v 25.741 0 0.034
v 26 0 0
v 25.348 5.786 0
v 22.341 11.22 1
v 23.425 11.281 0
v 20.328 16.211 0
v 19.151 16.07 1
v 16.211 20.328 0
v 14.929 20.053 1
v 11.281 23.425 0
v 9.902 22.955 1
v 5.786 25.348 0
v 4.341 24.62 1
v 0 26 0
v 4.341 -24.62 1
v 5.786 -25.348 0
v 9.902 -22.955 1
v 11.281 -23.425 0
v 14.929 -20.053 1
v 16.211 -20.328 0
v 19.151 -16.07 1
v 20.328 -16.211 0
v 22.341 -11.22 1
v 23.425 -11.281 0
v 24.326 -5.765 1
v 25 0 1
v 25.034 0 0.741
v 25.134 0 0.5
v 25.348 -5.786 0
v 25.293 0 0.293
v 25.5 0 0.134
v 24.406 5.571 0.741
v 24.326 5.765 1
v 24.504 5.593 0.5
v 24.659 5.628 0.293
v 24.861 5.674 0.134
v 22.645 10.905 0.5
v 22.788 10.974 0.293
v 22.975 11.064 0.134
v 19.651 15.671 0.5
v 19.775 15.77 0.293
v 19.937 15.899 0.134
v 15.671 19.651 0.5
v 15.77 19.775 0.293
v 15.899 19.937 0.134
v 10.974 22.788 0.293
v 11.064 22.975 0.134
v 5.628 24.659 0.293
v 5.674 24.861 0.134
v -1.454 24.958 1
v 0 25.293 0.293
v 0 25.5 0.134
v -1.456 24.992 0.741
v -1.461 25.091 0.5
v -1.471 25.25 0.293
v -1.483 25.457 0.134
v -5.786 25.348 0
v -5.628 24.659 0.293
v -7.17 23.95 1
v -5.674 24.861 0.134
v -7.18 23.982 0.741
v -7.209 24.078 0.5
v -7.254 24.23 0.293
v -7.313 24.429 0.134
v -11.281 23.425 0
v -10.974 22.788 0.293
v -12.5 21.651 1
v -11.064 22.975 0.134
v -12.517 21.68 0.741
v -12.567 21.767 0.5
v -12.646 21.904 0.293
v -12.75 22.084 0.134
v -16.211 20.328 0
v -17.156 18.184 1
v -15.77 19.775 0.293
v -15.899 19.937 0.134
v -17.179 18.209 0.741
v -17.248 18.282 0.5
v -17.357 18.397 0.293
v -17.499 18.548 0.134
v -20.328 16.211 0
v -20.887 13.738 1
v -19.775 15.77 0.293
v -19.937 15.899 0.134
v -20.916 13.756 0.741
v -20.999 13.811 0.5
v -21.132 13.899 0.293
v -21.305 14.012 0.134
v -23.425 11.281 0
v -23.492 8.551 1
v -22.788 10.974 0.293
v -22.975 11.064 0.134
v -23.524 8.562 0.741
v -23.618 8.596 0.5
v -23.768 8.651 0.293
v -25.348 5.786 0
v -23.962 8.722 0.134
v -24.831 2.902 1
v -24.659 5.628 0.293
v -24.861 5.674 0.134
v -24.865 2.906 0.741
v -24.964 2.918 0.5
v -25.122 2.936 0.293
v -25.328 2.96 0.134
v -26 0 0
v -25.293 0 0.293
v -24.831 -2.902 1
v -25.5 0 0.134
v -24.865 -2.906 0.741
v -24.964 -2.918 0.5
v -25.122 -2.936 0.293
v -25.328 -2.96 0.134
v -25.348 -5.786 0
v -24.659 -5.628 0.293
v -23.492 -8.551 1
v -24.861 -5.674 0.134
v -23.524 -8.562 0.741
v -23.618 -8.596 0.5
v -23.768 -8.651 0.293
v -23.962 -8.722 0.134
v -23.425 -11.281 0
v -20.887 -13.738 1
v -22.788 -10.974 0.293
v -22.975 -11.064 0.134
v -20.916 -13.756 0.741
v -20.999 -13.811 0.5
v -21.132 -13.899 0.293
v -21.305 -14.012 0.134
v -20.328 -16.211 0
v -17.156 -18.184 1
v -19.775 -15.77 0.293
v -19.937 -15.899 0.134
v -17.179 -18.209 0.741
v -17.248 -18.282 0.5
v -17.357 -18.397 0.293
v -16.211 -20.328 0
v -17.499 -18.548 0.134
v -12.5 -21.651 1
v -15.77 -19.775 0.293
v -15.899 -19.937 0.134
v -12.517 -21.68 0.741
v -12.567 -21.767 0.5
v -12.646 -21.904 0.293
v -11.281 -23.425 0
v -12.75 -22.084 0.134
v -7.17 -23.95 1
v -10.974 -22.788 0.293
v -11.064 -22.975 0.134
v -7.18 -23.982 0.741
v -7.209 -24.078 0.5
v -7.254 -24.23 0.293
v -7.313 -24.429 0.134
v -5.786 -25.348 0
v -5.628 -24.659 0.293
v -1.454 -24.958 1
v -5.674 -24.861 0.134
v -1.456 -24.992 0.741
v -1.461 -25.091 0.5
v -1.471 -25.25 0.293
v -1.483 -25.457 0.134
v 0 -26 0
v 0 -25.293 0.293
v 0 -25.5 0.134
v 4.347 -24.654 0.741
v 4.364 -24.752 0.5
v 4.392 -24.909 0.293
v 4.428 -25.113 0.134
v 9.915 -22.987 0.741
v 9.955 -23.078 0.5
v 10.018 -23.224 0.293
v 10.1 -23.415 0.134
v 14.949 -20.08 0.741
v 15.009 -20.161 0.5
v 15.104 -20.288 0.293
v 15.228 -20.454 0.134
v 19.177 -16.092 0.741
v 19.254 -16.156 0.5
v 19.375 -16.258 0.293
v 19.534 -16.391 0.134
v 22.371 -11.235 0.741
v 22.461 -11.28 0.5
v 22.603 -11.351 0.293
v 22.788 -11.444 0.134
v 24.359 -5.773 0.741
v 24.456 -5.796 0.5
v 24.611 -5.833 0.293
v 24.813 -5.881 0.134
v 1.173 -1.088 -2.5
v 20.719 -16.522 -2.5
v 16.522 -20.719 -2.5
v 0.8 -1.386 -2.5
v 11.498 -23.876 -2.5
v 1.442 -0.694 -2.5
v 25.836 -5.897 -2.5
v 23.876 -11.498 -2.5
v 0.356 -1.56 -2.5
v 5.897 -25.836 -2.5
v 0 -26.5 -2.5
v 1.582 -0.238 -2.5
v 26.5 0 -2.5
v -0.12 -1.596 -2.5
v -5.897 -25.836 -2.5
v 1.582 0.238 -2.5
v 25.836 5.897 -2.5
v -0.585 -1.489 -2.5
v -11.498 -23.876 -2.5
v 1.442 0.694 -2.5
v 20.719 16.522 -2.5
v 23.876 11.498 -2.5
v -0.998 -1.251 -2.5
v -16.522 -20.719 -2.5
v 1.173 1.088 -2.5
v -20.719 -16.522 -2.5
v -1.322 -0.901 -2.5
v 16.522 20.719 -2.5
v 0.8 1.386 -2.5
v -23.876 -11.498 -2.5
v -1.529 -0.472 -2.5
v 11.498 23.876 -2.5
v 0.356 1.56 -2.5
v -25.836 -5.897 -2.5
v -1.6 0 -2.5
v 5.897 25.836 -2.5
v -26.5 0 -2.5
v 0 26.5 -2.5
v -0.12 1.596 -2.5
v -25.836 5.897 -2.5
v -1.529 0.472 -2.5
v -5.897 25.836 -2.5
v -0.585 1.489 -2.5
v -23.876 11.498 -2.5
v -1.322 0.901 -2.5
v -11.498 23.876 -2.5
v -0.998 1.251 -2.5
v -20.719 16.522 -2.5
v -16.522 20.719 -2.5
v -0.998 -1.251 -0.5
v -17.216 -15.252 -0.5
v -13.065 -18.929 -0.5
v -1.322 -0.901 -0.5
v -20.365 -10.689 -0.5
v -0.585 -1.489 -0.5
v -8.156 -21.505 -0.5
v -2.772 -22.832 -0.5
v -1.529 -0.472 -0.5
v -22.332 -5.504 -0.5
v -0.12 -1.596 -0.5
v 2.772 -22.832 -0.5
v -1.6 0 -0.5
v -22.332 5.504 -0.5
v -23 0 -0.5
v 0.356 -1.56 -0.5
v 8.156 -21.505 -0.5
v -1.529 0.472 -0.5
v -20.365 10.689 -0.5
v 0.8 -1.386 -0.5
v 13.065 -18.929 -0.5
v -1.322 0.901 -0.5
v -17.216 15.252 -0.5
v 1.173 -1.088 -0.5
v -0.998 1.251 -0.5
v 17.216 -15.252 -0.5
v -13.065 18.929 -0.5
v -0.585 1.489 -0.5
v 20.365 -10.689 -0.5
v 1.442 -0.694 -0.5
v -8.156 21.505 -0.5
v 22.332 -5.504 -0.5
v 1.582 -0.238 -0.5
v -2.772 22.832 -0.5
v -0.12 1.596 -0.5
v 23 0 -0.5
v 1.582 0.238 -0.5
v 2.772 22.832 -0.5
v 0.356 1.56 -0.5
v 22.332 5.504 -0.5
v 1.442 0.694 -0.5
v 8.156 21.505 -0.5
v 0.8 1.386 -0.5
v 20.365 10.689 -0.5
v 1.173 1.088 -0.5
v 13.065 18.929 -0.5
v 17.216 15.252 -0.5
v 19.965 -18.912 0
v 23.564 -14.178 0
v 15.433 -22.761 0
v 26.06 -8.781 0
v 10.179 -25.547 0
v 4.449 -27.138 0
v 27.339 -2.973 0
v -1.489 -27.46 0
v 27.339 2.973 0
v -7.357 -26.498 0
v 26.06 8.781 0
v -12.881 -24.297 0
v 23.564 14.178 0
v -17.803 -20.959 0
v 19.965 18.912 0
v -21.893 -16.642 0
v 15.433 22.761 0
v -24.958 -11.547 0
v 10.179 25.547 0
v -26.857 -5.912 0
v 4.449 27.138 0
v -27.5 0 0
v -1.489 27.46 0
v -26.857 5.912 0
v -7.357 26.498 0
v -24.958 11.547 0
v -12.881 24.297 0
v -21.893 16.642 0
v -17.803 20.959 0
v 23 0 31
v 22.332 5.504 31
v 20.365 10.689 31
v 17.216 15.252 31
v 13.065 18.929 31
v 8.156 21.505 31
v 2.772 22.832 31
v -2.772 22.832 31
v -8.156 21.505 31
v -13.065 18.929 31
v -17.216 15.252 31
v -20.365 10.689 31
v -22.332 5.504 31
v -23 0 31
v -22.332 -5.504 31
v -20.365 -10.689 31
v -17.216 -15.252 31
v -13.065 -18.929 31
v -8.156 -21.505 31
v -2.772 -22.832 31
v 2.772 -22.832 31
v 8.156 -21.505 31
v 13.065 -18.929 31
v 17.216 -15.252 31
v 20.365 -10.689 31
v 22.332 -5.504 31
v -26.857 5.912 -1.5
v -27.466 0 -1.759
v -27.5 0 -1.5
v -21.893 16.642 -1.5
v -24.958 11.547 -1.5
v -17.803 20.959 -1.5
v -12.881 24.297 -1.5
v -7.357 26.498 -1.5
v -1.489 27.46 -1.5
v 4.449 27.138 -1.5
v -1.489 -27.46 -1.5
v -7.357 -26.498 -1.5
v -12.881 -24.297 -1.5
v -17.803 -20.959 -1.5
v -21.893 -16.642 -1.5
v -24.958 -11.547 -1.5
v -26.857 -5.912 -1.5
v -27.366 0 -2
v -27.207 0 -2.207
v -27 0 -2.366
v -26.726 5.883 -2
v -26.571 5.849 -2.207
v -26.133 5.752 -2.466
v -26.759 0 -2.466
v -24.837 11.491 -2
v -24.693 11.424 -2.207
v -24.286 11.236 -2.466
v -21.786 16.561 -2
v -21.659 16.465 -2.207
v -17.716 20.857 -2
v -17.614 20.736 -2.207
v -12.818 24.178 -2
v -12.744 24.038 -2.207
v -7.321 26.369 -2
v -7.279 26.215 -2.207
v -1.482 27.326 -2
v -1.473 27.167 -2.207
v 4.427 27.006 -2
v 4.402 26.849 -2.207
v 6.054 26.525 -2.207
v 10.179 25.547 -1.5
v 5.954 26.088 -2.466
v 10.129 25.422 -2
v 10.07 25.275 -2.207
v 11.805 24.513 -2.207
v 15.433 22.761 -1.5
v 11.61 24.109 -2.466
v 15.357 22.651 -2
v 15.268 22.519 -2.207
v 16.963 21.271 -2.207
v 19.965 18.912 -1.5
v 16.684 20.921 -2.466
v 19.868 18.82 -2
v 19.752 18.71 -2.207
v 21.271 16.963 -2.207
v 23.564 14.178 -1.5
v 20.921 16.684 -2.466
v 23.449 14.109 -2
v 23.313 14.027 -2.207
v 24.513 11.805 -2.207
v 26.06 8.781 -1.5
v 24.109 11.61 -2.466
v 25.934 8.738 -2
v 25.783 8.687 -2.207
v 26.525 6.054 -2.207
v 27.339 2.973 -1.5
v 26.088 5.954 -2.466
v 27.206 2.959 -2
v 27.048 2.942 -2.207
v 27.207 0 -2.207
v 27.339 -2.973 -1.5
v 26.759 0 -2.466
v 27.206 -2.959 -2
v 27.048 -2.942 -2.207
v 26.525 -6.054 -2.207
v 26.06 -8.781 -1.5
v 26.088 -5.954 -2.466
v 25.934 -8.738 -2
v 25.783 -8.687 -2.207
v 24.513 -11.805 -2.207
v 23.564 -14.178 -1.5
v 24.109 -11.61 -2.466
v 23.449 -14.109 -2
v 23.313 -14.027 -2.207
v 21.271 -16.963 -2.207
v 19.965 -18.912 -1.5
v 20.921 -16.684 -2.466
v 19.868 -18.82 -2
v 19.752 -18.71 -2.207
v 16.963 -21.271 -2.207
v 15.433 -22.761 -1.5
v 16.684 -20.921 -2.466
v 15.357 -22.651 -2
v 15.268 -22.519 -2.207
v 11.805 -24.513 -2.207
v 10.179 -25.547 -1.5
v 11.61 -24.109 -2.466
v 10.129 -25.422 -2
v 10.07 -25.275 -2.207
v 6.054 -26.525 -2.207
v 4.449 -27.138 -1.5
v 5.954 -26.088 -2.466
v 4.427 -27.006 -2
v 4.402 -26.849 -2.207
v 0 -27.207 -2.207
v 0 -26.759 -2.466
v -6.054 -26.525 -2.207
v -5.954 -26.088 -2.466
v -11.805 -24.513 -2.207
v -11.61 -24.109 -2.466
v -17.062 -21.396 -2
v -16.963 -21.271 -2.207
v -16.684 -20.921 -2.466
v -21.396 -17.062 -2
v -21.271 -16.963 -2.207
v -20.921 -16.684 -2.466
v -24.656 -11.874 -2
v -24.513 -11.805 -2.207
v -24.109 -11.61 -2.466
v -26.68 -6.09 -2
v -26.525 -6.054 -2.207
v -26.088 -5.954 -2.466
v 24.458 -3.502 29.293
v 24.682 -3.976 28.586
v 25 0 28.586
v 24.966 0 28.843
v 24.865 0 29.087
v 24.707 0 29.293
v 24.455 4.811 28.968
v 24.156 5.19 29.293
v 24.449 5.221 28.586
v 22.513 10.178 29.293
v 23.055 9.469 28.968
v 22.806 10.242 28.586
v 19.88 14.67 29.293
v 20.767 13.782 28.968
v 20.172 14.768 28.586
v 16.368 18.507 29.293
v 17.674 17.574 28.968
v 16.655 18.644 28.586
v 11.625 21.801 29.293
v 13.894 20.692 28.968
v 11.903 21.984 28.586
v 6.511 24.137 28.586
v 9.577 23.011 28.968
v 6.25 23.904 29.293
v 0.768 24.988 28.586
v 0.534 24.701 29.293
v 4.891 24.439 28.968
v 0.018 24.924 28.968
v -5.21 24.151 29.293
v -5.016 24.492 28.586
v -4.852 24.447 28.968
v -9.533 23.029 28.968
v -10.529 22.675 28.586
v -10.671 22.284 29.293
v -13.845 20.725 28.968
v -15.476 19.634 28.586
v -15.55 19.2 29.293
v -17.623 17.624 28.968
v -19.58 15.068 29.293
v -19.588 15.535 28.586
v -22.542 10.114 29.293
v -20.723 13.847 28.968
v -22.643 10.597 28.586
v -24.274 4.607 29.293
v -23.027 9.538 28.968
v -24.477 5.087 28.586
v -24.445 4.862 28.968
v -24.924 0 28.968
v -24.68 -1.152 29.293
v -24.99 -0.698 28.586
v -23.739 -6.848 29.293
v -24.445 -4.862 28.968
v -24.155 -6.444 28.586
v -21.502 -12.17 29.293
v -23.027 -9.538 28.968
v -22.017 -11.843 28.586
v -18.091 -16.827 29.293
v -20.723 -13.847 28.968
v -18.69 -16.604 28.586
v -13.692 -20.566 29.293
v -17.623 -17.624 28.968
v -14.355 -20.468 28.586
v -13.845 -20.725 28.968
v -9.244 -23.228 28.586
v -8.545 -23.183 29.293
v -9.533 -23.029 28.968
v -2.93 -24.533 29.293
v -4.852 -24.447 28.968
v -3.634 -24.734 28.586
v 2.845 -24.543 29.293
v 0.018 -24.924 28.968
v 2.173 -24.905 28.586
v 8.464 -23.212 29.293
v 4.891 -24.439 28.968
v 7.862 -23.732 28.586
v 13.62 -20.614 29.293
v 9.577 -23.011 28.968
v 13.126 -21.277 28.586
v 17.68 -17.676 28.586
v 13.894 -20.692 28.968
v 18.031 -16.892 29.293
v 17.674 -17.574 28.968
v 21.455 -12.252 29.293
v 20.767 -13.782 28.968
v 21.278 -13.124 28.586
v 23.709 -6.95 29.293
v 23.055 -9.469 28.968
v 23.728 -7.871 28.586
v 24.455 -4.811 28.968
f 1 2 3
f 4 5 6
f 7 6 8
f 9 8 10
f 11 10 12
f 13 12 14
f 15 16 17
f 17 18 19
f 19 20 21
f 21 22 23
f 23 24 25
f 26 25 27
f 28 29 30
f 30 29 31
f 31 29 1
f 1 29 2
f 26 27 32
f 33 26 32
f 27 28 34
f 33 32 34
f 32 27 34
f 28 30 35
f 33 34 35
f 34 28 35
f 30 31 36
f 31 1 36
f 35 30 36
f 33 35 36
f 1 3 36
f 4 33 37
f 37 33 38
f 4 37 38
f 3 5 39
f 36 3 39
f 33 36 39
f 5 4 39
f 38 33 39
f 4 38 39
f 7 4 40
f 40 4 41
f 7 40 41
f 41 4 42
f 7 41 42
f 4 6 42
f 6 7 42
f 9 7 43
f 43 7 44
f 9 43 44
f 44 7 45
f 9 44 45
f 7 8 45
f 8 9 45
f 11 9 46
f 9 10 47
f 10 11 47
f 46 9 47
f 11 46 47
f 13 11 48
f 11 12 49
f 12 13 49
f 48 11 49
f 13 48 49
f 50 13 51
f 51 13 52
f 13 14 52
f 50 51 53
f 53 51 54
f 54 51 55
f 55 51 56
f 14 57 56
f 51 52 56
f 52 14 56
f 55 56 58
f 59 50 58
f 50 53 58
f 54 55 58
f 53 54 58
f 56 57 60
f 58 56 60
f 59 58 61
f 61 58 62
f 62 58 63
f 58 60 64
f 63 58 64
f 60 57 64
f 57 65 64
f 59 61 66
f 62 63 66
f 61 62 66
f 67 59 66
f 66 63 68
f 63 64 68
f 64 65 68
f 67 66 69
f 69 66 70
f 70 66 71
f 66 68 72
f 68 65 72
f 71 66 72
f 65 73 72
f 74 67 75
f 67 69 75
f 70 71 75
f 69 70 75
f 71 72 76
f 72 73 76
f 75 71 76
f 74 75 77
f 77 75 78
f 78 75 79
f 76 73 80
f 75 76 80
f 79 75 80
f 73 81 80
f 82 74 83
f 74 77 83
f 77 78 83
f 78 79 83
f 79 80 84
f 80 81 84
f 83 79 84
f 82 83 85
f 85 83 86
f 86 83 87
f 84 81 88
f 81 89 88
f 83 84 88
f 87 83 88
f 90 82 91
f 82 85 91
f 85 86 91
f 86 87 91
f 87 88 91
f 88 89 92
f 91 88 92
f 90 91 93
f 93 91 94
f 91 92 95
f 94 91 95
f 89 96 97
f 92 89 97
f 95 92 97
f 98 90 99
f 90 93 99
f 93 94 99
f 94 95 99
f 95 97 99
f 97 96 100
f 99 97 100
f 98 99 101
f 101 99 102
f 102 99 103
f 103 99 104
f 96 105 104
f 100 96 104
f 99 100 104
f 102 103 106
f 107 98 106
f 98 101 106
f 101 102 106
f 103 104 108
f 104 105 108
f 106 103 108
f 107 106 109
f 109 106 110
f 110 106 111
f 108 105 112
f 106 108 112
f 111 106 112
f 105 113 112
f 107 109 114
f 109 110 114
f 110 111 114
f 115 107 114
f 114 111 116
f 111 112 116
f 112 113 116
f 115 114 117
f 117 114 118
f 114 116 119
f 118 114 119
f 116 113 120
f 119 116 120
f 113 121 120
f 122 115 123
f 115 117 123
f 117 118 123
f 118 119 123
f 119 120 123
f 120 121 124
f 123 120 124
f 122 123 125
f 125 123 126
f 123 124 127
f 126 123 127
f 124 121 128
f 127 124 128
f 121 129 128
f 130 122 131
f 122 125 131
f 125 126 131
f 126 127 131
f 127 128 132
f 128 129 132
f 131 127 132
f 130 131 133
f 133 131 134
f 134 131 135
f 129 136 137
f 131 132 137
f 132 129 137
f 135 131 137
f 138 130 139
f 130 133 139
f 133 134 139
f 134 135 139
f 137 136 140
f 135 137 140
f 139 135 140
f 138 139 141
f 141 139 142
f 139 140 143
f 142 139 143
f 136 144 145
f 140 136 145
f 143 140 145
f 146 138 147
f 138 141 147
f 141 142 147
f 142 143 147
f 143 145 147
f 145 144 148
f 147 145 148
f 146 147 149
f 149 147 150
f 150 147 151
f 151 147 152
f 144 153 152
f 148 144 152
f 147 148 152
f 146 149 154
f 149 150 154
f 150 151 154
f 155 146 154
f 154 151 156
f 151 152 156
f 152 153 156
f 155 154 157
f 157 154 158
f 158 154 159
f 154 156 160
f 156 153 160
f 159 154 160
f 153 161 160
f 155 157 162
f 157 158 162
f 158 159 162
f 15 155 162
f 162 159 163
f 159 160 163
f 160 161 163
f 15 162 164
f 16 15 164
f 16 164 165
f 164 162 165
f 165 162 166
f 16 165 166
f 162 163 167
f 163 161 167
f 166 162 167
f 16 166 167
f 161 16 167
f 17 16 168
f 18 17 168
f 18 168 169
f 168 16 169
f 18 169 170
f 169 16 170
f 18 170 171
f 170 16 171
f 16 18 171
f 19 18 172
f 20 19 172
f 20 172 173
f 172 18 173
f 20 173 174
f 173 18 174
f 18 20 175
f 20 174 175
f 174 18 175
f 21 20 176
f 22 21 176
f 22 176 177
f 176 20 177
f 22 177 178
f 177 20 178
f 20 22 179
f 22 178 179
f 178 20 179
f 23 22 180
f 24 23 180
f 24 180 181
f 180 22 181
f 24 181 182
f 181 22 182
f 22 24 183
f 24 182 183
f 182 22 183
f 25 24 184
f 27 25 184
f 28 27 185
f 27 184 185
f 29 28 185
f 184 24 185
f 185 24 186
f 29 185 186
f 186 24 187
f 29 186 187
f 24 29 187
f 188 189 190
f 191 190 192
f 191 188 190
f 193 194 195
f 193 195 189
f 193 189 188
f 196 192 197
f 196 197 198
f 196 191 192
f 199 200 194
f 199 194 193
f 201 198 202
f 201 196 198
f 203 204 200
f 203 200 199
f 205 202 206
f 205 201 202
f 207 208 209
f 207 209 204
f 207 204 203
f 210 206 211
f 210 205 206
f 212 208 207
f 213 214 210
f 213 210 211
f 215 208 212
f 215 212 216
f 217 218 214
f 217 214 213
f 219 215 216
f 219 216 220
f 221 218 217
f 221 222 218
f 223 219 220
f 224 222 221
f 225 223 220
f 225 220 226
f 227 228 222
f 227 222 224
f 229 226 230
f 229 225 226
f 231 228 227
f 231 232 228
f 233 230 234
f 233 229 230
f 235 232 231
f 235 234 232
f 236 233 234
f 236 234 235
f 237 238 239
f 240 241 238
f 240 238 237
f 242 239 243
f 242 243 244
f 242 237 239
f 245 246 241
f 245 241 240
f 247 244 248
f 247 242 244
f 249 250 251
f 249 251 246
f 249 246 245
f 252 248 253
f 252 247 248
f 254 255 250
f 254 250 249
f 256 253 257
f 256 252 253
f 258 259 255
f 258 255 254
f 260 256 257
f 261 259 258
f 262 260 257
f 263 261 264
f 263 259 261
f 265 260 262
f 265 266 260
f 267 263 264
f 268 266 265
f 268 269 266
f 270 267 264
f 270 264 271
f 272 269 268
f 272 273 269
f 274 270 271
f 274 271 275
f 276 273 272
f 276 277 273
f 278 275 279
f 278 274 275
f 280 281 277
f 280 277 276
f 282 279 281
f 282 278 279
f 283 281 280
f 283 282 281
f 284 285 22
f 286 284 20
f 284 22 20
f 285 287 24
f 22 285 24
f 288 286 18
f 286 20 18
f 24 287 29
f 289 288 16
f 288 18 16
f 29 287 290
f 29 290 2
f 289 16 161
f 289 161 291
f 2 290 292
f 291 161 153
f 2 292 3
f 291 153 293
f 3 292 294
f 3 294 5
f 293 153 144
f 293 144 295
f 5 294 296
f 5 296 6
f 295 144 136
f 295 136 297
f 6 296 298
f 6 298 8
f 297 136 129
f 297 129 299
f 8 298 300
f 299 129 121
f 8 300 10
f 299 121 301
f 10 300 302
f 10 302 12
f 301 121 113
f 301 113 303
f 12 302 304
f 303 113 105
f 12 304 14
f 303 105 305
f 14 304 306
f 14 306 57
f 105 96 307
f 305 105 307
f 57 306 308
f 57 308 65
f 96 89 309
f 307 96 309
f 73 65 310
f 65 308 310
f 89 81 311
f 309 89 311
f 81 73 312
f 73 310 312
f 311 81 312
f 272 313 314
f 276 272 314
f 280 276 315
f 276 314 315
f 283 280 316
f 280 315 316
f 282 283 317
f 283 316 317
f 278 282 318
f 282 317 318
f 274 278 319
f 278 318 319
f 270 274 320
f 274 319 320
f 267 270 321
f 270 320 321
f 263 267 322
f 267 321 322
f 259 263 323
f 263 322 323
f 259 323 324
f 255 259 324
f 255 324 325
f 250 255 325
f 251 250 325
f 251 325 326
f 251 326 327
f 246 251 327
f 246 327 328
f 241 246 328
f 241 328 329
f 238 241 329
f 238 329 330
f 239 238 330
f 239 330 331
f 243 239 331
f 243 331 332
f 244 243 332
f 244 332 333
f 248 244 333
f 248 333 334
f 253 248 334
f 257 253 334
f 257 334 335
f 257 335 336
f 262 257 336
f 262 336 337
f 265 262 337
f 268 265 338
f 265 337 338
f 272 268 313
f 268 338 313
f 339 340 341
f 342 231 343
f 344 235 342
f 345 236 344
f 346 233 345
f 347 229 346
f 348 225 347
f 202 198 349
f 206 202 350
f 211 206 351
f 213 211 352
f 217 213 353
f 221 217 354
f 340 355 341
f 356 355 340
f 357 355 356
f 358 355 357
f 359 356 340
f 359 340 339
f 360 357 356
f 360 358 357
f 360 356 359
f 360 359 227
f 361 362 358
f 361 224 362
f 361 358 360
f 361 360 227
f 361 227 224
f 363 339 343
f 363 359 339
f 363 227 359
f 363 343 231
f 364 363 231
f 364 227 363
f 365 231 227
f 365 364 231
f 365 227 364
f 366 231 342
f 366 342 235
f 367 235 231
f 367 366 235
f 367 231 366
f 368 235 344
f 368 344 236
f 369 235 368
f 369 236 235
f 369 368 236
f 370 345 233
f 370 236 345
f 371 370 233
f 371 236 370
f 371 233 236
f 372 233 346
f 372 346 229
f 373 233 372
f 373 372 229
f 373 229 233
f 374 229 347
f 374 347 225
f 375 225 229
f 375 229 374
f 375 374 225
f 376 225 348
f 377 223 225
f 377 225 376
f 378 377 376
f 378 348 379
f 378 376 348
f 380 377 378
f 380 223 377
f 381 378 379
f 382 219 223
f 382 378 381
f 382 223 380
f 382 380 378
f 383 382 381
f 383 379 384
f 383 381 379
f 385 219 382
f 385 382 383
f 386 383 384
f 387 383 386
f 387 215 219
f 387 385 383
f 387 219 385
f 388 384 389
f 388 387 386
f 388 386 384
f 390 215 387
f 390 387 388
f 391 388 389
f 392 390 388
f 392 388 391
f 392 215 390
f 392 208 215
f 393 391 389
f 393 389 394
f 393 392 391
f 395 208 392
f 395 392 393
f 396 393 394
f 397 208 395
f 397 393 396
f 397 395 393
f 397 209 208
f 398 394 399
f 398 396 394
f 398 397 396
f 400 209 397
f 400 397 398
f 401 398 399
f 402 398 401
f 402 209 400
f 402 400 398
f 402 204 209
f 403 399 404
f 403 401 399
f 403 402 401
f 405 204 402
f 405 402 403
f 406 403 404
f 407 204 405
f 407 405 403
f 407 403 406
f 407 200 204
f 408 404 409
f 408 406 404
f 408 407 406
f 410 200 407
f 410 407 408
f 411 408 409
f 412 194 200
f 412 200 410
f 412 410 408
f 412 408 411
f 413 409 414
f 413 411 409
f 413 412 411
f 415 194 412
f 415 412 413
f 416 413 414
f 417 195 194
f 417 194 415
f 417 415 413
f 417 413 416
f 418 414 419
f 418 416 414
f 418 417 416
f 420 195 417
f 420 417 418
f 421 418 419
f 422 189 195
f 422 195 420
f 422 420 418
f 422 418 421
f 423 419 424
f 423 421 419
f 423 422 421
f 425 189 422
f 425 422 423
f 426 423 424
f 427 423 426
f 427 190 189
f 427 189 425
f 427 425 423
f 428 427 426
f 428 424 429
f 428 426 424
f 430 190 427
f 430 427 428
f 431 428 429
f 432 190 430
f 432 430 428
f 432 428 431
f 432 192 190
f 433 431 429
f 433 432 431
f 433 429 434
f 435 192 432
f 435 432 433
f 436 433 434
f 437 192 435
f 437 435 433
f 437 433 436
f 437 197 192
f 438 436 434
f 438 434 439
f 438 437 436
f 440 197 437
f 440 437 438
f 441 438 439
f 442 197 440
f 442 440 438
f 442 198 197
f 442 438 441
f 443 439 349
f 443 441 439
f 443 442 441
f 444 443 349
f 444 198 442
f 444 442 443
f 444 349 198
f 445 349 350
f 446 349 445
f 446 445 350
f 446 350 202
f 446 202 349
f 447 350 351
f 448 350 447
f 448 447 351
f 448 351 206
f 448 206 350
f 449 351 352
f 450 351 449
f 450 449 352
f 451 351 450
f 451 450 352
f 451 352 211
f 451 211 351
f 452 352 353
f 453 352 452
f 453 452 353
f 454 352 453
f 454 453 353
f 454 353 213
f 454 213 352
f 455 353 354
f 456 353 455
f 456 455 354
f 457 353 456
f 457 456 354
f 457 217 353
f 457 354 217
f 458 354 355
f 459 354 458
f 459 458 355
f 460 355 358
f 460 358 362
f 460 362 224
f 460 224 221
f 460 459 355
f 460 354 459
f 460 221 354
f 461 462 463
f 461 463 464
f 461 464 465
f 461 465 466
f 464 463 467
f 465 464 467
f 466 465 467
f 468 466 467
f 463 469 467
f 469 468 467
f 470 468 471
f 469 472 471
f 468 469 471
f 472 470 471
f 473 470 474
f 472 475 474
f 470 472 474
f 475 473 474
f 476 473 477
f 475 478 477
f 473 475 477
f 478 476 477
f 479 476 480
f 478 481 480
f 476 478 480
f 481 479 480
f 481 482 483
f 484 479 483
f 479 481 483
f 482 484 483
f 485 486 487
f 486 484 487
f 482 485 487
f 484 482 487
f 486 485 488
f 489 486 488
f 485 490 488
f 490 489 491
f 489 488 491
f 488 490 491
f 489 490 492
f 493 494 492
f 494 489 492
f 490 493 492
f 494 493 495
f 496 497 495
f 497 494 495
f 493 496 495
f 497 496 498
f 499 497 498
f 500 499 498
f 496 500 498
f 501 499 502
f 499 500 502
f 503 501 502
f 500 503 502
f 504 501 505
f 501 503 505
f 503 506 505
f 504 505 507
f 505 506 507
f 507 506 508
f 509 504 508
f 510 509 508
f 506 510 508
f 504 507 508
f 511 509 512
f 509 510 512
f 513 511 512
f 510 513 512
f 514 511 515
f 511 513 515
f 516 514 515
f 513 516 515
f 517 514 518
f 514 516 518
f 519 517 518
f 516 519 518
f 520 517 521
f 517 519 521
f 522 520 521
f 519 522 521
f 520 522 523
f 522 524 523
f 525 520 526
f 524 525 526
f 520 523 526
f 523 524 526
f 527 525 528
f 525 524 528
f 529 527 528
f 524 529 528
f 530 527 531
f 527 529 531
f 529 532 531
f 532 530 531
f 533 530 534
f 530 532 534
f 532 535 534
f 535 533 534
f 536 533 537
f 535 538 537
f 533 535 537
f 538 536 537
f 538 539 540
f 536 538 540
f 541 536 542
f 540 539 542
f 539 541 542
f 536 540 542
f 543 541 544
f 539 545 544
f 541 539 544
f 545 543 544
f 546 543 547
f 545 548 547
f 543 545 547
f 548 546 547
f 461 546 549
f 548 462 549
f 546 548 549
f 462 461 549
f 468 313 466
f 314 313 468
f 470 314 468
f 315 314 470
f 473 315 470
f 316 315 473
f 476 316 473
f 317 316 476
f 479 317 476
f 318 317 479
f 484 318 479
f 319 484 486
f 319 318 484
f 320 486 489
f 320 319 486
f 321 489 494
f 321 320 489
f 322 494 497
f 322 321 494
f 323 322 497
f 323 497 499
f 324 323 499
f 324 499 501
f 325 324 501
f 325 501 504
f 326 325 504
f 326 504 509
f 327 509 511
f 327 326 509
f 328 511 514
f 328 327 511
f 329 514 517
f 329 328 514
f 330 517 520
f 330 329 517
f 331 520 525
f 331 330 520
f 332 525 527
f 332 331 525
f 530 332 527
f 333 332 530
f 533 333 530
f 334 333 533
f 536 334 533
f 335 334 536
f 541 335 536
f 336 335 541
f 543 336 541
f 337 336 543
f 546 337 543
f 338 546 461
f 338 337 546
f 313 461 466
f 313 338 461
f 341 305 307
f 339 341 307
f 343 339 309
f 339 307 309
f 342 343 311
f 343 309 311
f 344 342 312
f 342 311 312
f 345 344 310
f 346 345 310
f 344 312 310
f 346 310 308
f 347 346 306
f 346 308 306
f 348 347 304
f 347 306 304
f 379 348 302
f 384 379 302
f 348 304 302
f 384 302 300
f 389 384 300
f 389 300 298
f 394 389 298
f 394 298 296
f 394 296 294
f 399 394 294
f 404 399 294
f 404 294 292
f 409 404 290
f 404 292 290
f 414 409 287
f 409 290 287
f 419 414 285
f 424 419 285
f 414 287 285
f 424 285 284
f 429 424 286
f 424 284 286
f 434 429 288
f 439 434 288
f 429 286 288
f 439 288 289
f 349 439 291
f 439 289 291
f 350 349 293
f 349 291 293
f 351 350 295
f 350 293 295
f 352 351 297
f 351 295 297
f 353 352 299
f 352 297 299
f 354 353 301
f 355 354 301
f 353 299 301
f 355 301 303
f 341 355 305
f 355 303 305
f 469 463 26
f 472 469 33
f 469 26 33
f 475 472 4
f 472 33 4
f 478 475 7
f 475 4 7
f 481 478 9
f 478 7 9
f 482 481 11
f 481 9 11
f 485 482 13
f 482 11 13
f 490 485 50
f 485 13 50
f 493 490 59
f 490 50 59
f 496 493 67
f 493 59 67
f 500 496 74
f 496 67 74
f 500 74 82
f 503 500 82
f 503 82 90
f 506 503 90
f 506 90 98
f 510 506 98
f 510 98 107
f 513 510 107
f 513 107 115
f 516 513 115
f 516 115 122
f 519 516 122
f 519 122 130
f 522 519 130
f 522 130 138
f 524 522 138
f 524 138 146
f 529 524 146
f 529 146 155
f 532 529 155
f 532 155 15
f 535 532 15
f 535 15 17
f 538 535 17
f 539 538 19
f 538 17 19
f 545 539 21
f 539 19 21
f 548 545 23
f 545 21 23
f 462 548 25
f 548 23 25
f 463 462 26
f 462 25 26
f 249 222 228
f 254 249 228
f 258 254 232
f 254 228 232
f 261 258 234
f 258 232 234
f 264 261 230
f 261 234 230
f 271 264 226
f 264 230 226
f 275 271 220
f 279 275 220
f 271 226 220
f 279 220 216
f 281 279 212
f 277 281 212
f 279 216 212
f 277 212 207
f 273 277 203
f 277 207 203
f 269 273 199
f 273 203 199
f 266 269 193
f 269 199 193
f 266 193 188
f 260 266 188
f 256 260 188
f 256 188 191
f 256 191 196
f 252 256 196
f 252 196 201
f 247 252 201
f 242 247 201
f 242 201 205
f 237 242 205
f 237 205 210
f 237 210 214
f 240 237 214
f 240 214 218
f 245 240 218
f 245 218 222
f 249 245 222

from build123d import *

# Parameters (mm, degrees)
SKETCH_1_R          = 25
EXTRUDE_1_DEPTH     = 32
SKETCH_2_R          = 27.5
EXTRUDE_2_DEPTH     = 2.5
SKETCH_3_R          = 23
CUT_EXTRUDE_1_DEPTH = 32.5
CHAMFER_1_SIZE      = 3
FILLET_1_R          = 1
FILLET_2_R          = 1
FILLET_3_R          = 1
SKETCH_4_R          = 1.6
CUT_EXTRUDE_2_DEPTH = 32.5


with BuildPart() as part:
    # Эскиз1 → Бобышка-Вытянуть1 (new body)
    with BuildSketch(Plane.XY):
        Circle(SKETCH_1_R)
    extrude(amount=EXTRUDE_1_DEPTH)

    # Эскиз2 → Бобышка-Вытянуть2 (add)
    with BuildSketch(Plane(origin=(0, 0, 0), x_dir=(-1, 0, 0), z_dir=(0, 0, -1))):
        Circle(SKETCH_2_R)
    extrude(amount=EXTRUDE_2_DEPTH)

    # Эскиз3 → Вырез-Вытянуть1 (cut)
    with BuildSketch(Plane.XY.offset(32)):
        Circle(SKETCH_3_R)
    extrude(amount=-CUT_EXTRUDE_1_DEPTH, mode=Mode.SUBTRACT)

    # Фаска1
    # the kernel refuses this chamfer: 3 mm, written as the material it takes off along each edge
    with BuildSketch(Plane(origin=(0, 0, 32), x_dir=(1, 0, 0), z_dir=(0, -1, 0))) as chamfer_1_piece_1:
        Polygon((25, -CHAMFER_1_SIZE), (25 - CHAMFER_1_SIZE, 0), (25, 0), align=None)
    revolve(axis=Axis((0, 0, 32), (0, 0, 1)), mode=Mode.SUBTRACT)

    # Скругление1
    fillet_1_edges = [part.edges().sort_by_distance(p)[0] for p in [
        (-25, 0, 29),
    ]]
    fillet(fillet_1_edges, radius=FILLET_1_R)

    # Скругление2
    fillet_2_edges = [part.edges().sort_by_distance(p)[0] for p in [
        (-25, 0, 0),
    ]]
    fillet(fillet_2_edges, radius=FILLET_2_R)

    # Скругление3
    fillet_3_edges = [part.edges().sort_by_distance(p)[0] for p in [
        (27.5, 0, -2.5),
    ]]
    fillet(fillet_3_edges, radius=FILLET_3_R)

    # Эскиз4 → Вырез-Вытянуть2 (cut)
    with BuildSketch(Plane(origin=(0, 0, -2.5), x_dir=(-1, 0, 0), z_dir=(0, 0, -1))):
        Circle(SKETCH_4_R)
    extrude(amount=-CUT_EXTRUDE_2_DEPTH, mode=Mode.SUBTRACT)


solid = part.part
